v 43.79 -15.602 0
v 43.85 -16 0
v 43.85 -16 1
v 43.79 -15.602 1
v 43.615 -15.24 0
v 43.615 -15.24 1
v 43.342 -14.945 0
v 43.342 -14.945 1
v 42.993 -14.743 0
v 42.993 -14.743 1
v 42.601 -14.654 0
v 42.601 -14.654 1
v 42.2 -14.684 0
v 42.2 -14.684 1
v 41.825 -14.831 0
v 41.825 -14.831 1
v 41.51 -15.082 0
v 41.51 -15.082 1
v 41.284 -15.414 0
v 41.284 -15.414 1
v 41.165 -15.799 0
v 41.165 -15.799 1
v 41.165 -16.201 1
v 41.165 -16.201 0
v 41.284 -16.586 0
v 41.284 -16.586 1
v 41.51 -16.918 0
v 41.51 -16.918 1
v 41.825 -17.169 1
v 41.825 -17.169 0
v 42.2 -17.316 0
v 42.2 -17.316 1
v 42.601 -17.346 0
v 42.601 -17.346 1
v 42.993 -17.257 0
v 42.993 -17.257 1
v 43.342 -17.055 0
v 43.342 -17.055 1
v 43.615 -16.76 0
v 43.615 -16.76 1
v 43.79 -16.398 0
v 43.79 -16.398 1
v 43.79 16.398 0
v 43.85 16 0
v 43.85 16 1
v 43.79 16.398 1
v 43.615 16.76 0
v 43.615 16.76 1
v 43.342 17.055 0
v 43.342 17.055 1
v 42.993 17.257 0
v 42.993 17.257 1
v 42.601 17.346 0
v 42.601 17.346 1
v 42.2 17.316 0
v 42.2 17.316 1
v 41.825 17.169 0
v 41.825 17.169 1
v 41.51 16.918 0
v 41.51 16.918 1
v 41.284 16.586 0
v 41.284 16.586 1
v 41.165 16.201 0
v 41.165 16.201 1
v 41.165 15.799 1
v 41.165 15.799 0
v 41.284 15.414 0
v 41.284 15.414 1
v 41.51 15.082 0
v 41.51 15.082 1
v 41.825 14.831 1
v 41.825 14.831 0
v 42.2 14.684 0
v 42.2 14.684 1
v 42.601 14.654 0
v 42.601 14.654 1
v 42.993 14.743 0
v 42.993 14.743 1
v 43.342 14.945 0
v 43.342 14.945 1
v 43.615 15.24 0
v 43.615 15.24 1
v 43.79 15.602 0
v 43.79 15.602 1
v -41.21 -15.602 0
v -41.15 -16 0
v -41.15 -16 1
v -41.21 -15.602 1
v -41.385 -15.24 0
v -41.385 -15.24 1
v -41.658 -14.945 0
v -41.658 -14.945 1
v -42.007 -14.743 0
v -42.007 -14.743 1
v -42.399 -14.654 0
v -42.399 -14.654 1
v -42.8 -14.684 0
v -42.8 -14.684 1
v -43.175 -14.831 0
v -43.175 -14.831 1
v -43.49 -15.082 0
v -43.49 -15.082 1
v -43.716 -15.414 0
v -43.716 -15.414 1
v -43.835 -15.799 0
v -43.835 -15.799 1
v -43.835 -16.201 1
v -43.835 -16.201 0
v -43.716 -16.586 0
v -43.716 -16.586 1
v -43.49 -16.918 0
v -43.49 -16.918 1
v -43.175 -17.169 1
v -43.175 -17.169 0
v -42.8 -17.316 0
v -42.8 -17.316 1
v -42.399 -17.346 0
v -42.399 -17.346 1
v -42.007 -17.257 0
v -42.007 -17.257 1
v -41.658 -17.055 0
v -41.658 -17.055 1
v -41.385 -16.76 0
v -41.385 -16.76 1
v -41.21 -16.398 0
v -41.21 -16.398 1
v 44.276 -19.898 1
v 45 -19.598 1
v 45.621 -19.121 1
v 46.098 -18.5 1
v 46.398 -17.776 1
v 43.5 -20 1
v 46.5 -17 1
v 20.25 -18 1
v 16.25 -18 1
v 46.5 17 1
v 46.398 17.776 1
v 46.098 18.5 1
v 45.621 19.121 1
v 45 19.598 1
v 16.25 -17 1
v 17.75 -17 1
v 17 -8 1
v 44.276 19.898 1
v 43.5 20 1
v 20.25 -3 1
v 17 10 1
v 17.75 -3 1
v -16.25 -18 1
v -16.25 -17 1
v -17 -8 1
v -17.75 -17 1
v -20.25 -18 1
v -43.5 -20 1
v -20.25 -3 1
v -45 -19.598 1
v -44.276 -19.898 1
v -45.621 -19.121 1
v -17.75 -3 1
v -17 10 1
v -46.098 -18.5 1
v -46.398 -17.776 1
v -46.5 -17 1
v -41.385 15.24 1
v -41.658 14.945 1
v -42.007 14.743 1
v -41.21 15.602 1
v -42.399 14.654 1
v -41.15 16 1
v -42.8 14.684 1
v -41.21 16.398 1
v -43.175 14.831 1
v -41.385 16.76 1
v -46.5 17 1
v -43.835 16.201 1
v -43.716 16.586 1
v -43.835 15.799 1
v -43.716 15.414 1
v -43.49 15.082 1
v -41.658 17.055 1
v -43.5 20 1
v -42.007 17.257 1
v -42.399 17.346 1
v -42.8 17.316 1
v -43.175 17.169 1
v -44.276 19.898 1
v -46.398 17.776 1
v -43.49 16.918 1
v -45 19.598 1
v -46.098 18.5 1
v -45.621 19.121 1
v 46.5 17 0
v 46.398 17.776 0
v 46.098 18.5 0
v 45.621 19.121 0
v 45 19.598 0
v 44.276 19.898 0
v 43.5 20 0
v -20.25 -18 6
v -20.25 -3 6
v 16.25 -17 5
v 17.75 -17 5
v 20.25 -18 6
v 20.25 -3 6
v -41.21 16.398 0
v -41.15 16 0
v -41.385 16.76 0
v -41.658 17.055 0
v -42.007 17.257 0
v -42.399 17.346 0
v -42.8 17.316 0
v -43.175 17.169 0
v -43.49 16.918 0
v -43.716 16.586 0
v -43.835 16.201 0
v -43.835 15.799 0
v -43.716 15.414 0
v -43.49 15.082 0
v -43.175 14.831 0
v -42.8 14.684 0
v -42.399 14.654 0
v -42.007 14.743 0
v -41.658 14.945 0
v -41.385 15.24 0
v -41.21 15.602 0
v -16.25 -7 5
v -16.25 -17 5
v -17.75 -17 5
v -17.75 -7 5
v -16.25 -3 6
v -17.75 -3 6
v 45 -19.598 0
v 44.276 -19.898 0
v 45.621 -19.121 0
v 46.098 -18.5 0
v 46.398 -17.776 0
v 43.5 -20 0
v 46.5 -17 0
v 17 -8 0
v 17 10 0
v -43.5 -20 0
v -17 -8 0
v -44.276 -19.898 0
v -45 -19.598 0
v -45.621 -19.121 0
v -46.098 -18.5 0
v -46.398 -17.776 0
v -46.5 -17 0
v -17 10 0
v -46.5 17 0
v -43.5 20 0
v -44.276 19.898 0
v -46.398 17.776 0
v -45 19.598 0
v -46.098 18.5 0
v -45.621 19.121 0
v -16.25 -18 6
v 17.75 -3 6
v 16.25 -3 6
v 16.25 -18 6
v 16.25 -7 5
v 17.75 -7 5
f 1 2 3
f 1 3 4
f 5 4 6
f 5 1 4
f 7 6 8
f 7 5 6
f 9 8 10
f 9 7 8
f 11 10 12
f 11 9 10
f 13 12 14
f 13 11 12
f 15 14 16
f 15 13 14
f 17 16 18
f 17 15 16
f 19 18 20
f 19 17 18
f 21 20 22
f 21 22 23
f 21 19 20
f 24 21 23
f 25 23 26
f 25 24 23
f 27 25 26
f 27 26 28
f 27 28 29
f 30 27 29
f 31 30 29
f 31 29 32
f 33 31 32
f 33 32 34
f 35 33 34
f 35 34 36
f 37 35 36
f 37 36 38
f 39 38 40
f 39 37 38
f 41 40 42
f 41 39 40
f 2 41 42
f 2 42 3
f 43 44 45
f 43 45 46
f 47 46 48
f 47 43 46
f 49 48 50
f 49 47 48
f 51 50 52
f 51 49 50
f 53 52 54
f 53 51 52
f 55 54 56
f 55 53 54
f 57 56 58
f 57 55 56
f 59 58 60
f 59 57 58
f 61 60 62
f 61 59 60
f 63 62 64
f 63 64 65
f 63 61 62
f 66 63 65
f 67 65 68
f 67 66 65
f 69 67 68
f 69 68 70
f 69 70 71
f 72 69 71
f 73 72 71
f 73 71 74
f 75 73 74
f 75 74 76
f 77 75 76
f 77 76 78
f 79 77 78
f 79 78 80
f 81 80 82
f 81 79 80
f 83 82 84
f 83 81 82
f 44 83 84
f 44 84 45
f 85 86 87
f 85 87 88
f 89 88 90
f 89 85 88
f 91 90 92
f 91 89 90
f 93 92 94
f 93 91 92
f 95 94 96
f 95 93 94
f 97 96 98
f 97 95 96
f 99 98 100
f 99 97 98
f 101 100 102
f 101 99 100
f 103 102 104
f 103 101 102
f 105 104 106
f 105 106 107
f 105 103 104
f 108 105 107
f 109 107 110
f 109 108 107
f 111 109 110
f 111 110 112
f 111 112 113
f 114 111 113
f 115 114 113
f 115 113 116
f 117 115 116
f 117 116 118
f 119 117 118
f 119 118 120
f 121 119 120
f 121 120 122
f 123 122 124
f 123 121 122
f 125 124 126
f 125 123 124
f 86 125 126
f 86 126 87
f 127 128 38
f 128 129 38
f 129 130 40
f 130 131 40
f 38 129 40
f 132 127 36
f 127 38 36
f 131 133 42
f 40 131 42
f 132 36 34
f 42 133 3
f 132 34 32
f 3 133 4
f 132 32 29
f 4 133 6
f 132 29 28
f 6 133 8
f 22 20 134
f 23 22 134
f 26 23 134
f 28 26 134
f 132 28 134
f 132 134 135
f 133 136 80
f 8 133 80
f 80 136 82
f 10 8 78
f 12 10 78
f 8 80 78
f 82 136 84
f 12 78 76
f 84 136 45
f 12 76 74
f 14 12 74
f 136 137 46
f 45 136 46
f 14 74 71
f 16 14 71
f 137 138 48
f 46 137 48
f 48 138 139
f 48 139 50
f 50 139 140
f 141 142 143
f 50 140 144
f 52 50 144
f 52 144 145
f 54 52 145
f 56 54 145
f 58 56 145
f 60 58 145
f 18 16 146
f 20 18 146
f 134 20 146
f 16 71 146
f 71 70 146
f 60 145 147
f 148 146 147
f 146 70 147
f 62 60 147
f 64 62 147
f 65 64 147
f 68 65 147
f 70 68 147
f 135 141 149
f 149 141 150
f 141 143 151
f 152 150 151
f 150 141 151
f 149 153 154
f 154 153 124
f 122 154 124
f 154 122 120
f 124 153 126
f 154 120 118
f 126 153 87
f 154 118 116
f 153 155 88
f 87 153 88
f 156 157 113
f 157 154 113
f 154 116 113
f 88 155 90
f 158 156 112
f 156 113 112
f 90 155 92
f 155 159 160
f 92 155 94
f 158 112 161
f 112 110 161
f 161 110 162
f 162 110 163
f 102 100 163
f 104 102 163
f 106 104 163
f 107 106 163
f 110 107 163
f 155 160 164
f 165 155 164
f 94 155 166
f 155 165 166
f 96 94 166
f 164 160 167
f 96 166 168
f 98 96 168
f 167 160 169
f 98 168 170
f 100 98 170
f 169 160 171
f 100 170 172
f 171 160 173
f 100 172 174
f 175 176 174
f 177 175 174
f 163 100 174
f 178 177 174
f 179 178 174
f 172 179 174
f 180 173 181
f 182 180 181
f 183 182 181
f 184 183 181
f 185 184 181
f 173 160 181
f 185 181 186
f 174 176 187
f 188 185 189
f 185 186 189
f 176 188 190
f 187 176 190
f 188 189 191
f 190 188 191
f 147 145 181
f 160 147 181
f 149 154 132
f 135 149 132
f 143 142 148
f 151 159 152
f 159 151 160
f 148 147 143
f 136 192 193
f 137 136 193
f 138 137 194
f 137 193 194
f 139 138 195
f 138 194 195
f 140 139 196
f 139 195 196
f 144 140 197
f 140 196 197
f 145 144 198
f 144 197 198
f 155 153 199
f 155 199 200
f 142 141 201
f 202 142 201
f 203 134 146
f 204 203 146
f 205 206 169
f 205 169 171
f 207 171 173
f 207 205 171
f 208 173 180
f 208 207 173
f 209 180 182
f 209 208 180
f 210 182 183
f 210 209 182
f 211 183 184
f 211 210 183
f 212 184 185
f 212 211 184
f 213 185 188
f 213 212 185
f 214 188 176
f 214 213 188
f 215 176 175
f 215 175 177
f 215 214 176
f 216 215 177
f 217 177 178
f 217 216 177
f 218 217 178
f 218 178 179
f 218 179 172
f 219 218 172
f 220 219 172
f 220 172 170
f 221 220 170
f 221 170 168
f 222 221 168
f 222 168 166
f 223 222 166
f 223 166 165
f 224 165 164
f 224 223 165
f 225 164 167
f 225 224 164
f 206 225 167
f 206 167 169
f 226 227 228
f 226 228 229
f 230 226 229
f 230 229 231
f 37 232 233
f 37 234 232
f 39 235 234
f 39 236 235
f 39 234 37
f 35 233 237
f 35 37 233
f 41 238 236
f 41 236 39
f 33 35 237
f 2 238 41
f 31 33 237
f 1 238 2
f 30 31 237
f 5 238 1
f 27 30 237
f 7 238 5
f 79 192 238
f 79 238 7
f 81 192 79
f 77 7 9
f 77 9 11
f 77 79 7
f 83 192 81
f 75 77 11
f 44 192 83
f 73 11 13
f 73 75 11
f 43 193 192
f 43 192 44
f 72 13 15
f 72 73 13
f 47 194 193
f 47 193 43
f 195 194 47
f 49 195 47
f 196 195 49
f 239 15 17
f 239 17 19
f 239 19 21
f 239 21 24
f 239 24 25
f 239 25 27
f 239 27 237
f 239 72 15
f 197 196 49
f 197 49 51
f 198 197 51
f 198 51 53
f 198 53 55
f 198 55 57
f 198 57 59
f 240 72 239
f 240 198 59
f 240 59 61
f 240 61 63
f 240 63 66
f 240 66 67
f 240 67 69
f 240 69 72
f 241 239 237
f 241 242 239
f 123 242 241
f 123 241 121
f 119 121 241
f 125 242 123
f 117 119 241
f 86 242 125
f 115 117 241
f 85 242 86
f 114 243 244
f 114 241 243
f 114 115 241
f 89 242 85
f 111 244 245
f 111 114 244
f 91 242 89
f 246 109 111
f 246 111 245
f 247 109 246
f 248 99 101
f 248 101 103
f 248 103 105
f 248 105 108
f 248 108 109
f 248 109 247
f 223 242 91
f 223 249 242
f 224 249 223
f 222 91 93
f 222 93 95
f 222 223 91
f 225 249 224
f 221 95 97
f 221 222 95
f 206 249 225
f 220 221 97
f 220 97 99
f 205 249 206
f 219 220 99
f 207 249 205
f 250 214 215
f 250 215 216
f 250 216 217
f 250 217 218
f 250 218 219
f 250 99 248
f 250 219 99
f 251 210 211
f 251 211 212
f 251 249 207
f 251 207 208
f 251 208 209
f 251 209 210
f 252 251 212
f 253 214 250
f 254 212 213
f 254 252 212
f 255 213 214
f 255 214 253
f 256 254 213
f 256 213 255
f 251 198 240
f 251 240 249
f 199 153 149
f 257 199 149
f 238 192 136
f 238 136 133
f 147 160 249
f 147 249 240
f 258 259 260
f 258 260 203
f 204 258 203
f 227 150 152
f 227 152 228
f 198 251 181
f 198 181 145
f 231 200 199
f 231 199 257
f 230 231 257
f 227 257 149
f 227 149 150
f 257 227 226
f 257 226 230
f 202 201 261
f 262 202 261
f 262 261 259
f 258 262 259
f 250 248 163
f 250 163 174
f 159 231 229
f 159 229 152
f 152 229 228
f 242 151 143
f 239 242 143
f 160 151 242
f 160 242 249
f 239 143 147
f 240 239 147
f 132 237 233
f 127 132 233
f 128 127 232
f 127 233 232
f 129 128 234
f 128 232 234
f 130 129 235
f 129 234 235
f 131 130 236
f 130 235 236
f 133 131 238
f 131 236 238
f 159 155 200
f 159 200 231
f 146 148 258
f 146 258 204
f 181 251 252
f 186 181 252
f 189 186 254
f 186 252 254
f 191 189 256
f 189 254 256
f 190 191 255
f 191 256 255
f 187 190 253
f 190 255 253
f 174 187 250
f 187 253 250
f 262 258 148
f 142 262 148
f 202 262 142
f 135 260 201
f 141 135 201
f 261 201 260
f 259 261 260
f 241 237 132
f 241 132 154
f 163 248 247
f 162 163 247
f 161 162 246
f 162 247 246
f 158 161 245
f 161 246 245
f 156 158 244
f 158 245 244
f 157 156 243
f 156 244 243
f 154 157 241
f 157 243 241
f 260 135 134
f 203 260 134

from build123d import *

# Parameters (mm, degrees)
SKETCH_R        = 1.35
PAD_DEPTH       = 1
SKETCH002_W     = 4
SKETCH002_H     = 15
PAD001_DEPTH    = 5
POCKET_DEPTH    = 1.5
SKETCH004_W     = 34
SKETCH004_H     = 18
POCKET001_DEPTH = 5


with BuildPart() as part:
    # Sketch → Pad (new body)
    with BuildSketch(Plane.XY):
        with BuildLine():
            Line((-43.5, 20), (43.5, 20))
            ThreePointArc((46.5, 17), (45.62132, 19.12132), (43.5, 20))
            Line((46.5, 17), (46.5, -17))
            ThreePointArc((43.5, -20), (45.62132, -19.12132), (46.5, -17))
            Line((43.5, -20), (-43.5, -20))
            ThreePointArc((-46.5, -17), (-45.62132, -19.12132), (-43.5, -20))
            Line((-46.5, -17), (-46.5, 17))
            ThreePointArc((-43.5, 20), (-45.62132, 19.12132), (-46.5, 17))
        make_face()
        with Locations((-42.5, 16)):
            Circle(SKETCH_R, mode=Mode.SUBTRACT)
        with Locations((42.5, 16)):
            Circle(SKETCH_R, mode=Mode.SUBTRACT)
        with Locations((-42.5, -16)):
            Circle(SKETCH_R, mode=Mode.SUBTRACT)
        with Locations((42.5, -16)):
            Circle(SKETCH_R, mode=Mode.SUBTRACT)
    extrude(amount=PAD_DEPTH)

    # Sketch002 (on Face14 of Pad) → Pad001 (join)
    with BuildSketch(Plane.XY.offset(1)):
        with Locations((18.25, -10.5)):
            Rectangle(SKETCH002_W, SKETCH002_H)
        with Locations((-18.25, -10.5)):
            Rectangle(SKETCH002_W, SKETCH002_H)
    extrude(amount=PAD001_DEPTH)

    # Sketch003 (on Face21 of Pad001) → Pocket (cut)
    with BuildSketch(Plane(origin=(16.25, 0, 0), x_dir=(0, -1, 0), z_dir=(-1, 0, 0))):
        Polygon((3, 6), (3, 1), (17, 1), (17, 5), (7, 5), align=None)
    pocket = extrude(amount=-POCKET_DEPTH, mode=Mode.SUBTRACT)

    # Mirrored: Pocket across YZ
    add(pocket.mirror(Plane.YZ), mode=Mode.SUBTRACT)

    # Sketch004 (on Face5 of Mirrored) → Pocket001 (cut)
    with BuildSketch(Plane.XY.offset(1)):
        with Locations((0, 1)):
            Rectangle(SKETCH004_W, SKETCH004_H)
    extrude(amount=-POCKET001_DEPTH, mode=Mode.SUBTRACT)


solid = part.part
